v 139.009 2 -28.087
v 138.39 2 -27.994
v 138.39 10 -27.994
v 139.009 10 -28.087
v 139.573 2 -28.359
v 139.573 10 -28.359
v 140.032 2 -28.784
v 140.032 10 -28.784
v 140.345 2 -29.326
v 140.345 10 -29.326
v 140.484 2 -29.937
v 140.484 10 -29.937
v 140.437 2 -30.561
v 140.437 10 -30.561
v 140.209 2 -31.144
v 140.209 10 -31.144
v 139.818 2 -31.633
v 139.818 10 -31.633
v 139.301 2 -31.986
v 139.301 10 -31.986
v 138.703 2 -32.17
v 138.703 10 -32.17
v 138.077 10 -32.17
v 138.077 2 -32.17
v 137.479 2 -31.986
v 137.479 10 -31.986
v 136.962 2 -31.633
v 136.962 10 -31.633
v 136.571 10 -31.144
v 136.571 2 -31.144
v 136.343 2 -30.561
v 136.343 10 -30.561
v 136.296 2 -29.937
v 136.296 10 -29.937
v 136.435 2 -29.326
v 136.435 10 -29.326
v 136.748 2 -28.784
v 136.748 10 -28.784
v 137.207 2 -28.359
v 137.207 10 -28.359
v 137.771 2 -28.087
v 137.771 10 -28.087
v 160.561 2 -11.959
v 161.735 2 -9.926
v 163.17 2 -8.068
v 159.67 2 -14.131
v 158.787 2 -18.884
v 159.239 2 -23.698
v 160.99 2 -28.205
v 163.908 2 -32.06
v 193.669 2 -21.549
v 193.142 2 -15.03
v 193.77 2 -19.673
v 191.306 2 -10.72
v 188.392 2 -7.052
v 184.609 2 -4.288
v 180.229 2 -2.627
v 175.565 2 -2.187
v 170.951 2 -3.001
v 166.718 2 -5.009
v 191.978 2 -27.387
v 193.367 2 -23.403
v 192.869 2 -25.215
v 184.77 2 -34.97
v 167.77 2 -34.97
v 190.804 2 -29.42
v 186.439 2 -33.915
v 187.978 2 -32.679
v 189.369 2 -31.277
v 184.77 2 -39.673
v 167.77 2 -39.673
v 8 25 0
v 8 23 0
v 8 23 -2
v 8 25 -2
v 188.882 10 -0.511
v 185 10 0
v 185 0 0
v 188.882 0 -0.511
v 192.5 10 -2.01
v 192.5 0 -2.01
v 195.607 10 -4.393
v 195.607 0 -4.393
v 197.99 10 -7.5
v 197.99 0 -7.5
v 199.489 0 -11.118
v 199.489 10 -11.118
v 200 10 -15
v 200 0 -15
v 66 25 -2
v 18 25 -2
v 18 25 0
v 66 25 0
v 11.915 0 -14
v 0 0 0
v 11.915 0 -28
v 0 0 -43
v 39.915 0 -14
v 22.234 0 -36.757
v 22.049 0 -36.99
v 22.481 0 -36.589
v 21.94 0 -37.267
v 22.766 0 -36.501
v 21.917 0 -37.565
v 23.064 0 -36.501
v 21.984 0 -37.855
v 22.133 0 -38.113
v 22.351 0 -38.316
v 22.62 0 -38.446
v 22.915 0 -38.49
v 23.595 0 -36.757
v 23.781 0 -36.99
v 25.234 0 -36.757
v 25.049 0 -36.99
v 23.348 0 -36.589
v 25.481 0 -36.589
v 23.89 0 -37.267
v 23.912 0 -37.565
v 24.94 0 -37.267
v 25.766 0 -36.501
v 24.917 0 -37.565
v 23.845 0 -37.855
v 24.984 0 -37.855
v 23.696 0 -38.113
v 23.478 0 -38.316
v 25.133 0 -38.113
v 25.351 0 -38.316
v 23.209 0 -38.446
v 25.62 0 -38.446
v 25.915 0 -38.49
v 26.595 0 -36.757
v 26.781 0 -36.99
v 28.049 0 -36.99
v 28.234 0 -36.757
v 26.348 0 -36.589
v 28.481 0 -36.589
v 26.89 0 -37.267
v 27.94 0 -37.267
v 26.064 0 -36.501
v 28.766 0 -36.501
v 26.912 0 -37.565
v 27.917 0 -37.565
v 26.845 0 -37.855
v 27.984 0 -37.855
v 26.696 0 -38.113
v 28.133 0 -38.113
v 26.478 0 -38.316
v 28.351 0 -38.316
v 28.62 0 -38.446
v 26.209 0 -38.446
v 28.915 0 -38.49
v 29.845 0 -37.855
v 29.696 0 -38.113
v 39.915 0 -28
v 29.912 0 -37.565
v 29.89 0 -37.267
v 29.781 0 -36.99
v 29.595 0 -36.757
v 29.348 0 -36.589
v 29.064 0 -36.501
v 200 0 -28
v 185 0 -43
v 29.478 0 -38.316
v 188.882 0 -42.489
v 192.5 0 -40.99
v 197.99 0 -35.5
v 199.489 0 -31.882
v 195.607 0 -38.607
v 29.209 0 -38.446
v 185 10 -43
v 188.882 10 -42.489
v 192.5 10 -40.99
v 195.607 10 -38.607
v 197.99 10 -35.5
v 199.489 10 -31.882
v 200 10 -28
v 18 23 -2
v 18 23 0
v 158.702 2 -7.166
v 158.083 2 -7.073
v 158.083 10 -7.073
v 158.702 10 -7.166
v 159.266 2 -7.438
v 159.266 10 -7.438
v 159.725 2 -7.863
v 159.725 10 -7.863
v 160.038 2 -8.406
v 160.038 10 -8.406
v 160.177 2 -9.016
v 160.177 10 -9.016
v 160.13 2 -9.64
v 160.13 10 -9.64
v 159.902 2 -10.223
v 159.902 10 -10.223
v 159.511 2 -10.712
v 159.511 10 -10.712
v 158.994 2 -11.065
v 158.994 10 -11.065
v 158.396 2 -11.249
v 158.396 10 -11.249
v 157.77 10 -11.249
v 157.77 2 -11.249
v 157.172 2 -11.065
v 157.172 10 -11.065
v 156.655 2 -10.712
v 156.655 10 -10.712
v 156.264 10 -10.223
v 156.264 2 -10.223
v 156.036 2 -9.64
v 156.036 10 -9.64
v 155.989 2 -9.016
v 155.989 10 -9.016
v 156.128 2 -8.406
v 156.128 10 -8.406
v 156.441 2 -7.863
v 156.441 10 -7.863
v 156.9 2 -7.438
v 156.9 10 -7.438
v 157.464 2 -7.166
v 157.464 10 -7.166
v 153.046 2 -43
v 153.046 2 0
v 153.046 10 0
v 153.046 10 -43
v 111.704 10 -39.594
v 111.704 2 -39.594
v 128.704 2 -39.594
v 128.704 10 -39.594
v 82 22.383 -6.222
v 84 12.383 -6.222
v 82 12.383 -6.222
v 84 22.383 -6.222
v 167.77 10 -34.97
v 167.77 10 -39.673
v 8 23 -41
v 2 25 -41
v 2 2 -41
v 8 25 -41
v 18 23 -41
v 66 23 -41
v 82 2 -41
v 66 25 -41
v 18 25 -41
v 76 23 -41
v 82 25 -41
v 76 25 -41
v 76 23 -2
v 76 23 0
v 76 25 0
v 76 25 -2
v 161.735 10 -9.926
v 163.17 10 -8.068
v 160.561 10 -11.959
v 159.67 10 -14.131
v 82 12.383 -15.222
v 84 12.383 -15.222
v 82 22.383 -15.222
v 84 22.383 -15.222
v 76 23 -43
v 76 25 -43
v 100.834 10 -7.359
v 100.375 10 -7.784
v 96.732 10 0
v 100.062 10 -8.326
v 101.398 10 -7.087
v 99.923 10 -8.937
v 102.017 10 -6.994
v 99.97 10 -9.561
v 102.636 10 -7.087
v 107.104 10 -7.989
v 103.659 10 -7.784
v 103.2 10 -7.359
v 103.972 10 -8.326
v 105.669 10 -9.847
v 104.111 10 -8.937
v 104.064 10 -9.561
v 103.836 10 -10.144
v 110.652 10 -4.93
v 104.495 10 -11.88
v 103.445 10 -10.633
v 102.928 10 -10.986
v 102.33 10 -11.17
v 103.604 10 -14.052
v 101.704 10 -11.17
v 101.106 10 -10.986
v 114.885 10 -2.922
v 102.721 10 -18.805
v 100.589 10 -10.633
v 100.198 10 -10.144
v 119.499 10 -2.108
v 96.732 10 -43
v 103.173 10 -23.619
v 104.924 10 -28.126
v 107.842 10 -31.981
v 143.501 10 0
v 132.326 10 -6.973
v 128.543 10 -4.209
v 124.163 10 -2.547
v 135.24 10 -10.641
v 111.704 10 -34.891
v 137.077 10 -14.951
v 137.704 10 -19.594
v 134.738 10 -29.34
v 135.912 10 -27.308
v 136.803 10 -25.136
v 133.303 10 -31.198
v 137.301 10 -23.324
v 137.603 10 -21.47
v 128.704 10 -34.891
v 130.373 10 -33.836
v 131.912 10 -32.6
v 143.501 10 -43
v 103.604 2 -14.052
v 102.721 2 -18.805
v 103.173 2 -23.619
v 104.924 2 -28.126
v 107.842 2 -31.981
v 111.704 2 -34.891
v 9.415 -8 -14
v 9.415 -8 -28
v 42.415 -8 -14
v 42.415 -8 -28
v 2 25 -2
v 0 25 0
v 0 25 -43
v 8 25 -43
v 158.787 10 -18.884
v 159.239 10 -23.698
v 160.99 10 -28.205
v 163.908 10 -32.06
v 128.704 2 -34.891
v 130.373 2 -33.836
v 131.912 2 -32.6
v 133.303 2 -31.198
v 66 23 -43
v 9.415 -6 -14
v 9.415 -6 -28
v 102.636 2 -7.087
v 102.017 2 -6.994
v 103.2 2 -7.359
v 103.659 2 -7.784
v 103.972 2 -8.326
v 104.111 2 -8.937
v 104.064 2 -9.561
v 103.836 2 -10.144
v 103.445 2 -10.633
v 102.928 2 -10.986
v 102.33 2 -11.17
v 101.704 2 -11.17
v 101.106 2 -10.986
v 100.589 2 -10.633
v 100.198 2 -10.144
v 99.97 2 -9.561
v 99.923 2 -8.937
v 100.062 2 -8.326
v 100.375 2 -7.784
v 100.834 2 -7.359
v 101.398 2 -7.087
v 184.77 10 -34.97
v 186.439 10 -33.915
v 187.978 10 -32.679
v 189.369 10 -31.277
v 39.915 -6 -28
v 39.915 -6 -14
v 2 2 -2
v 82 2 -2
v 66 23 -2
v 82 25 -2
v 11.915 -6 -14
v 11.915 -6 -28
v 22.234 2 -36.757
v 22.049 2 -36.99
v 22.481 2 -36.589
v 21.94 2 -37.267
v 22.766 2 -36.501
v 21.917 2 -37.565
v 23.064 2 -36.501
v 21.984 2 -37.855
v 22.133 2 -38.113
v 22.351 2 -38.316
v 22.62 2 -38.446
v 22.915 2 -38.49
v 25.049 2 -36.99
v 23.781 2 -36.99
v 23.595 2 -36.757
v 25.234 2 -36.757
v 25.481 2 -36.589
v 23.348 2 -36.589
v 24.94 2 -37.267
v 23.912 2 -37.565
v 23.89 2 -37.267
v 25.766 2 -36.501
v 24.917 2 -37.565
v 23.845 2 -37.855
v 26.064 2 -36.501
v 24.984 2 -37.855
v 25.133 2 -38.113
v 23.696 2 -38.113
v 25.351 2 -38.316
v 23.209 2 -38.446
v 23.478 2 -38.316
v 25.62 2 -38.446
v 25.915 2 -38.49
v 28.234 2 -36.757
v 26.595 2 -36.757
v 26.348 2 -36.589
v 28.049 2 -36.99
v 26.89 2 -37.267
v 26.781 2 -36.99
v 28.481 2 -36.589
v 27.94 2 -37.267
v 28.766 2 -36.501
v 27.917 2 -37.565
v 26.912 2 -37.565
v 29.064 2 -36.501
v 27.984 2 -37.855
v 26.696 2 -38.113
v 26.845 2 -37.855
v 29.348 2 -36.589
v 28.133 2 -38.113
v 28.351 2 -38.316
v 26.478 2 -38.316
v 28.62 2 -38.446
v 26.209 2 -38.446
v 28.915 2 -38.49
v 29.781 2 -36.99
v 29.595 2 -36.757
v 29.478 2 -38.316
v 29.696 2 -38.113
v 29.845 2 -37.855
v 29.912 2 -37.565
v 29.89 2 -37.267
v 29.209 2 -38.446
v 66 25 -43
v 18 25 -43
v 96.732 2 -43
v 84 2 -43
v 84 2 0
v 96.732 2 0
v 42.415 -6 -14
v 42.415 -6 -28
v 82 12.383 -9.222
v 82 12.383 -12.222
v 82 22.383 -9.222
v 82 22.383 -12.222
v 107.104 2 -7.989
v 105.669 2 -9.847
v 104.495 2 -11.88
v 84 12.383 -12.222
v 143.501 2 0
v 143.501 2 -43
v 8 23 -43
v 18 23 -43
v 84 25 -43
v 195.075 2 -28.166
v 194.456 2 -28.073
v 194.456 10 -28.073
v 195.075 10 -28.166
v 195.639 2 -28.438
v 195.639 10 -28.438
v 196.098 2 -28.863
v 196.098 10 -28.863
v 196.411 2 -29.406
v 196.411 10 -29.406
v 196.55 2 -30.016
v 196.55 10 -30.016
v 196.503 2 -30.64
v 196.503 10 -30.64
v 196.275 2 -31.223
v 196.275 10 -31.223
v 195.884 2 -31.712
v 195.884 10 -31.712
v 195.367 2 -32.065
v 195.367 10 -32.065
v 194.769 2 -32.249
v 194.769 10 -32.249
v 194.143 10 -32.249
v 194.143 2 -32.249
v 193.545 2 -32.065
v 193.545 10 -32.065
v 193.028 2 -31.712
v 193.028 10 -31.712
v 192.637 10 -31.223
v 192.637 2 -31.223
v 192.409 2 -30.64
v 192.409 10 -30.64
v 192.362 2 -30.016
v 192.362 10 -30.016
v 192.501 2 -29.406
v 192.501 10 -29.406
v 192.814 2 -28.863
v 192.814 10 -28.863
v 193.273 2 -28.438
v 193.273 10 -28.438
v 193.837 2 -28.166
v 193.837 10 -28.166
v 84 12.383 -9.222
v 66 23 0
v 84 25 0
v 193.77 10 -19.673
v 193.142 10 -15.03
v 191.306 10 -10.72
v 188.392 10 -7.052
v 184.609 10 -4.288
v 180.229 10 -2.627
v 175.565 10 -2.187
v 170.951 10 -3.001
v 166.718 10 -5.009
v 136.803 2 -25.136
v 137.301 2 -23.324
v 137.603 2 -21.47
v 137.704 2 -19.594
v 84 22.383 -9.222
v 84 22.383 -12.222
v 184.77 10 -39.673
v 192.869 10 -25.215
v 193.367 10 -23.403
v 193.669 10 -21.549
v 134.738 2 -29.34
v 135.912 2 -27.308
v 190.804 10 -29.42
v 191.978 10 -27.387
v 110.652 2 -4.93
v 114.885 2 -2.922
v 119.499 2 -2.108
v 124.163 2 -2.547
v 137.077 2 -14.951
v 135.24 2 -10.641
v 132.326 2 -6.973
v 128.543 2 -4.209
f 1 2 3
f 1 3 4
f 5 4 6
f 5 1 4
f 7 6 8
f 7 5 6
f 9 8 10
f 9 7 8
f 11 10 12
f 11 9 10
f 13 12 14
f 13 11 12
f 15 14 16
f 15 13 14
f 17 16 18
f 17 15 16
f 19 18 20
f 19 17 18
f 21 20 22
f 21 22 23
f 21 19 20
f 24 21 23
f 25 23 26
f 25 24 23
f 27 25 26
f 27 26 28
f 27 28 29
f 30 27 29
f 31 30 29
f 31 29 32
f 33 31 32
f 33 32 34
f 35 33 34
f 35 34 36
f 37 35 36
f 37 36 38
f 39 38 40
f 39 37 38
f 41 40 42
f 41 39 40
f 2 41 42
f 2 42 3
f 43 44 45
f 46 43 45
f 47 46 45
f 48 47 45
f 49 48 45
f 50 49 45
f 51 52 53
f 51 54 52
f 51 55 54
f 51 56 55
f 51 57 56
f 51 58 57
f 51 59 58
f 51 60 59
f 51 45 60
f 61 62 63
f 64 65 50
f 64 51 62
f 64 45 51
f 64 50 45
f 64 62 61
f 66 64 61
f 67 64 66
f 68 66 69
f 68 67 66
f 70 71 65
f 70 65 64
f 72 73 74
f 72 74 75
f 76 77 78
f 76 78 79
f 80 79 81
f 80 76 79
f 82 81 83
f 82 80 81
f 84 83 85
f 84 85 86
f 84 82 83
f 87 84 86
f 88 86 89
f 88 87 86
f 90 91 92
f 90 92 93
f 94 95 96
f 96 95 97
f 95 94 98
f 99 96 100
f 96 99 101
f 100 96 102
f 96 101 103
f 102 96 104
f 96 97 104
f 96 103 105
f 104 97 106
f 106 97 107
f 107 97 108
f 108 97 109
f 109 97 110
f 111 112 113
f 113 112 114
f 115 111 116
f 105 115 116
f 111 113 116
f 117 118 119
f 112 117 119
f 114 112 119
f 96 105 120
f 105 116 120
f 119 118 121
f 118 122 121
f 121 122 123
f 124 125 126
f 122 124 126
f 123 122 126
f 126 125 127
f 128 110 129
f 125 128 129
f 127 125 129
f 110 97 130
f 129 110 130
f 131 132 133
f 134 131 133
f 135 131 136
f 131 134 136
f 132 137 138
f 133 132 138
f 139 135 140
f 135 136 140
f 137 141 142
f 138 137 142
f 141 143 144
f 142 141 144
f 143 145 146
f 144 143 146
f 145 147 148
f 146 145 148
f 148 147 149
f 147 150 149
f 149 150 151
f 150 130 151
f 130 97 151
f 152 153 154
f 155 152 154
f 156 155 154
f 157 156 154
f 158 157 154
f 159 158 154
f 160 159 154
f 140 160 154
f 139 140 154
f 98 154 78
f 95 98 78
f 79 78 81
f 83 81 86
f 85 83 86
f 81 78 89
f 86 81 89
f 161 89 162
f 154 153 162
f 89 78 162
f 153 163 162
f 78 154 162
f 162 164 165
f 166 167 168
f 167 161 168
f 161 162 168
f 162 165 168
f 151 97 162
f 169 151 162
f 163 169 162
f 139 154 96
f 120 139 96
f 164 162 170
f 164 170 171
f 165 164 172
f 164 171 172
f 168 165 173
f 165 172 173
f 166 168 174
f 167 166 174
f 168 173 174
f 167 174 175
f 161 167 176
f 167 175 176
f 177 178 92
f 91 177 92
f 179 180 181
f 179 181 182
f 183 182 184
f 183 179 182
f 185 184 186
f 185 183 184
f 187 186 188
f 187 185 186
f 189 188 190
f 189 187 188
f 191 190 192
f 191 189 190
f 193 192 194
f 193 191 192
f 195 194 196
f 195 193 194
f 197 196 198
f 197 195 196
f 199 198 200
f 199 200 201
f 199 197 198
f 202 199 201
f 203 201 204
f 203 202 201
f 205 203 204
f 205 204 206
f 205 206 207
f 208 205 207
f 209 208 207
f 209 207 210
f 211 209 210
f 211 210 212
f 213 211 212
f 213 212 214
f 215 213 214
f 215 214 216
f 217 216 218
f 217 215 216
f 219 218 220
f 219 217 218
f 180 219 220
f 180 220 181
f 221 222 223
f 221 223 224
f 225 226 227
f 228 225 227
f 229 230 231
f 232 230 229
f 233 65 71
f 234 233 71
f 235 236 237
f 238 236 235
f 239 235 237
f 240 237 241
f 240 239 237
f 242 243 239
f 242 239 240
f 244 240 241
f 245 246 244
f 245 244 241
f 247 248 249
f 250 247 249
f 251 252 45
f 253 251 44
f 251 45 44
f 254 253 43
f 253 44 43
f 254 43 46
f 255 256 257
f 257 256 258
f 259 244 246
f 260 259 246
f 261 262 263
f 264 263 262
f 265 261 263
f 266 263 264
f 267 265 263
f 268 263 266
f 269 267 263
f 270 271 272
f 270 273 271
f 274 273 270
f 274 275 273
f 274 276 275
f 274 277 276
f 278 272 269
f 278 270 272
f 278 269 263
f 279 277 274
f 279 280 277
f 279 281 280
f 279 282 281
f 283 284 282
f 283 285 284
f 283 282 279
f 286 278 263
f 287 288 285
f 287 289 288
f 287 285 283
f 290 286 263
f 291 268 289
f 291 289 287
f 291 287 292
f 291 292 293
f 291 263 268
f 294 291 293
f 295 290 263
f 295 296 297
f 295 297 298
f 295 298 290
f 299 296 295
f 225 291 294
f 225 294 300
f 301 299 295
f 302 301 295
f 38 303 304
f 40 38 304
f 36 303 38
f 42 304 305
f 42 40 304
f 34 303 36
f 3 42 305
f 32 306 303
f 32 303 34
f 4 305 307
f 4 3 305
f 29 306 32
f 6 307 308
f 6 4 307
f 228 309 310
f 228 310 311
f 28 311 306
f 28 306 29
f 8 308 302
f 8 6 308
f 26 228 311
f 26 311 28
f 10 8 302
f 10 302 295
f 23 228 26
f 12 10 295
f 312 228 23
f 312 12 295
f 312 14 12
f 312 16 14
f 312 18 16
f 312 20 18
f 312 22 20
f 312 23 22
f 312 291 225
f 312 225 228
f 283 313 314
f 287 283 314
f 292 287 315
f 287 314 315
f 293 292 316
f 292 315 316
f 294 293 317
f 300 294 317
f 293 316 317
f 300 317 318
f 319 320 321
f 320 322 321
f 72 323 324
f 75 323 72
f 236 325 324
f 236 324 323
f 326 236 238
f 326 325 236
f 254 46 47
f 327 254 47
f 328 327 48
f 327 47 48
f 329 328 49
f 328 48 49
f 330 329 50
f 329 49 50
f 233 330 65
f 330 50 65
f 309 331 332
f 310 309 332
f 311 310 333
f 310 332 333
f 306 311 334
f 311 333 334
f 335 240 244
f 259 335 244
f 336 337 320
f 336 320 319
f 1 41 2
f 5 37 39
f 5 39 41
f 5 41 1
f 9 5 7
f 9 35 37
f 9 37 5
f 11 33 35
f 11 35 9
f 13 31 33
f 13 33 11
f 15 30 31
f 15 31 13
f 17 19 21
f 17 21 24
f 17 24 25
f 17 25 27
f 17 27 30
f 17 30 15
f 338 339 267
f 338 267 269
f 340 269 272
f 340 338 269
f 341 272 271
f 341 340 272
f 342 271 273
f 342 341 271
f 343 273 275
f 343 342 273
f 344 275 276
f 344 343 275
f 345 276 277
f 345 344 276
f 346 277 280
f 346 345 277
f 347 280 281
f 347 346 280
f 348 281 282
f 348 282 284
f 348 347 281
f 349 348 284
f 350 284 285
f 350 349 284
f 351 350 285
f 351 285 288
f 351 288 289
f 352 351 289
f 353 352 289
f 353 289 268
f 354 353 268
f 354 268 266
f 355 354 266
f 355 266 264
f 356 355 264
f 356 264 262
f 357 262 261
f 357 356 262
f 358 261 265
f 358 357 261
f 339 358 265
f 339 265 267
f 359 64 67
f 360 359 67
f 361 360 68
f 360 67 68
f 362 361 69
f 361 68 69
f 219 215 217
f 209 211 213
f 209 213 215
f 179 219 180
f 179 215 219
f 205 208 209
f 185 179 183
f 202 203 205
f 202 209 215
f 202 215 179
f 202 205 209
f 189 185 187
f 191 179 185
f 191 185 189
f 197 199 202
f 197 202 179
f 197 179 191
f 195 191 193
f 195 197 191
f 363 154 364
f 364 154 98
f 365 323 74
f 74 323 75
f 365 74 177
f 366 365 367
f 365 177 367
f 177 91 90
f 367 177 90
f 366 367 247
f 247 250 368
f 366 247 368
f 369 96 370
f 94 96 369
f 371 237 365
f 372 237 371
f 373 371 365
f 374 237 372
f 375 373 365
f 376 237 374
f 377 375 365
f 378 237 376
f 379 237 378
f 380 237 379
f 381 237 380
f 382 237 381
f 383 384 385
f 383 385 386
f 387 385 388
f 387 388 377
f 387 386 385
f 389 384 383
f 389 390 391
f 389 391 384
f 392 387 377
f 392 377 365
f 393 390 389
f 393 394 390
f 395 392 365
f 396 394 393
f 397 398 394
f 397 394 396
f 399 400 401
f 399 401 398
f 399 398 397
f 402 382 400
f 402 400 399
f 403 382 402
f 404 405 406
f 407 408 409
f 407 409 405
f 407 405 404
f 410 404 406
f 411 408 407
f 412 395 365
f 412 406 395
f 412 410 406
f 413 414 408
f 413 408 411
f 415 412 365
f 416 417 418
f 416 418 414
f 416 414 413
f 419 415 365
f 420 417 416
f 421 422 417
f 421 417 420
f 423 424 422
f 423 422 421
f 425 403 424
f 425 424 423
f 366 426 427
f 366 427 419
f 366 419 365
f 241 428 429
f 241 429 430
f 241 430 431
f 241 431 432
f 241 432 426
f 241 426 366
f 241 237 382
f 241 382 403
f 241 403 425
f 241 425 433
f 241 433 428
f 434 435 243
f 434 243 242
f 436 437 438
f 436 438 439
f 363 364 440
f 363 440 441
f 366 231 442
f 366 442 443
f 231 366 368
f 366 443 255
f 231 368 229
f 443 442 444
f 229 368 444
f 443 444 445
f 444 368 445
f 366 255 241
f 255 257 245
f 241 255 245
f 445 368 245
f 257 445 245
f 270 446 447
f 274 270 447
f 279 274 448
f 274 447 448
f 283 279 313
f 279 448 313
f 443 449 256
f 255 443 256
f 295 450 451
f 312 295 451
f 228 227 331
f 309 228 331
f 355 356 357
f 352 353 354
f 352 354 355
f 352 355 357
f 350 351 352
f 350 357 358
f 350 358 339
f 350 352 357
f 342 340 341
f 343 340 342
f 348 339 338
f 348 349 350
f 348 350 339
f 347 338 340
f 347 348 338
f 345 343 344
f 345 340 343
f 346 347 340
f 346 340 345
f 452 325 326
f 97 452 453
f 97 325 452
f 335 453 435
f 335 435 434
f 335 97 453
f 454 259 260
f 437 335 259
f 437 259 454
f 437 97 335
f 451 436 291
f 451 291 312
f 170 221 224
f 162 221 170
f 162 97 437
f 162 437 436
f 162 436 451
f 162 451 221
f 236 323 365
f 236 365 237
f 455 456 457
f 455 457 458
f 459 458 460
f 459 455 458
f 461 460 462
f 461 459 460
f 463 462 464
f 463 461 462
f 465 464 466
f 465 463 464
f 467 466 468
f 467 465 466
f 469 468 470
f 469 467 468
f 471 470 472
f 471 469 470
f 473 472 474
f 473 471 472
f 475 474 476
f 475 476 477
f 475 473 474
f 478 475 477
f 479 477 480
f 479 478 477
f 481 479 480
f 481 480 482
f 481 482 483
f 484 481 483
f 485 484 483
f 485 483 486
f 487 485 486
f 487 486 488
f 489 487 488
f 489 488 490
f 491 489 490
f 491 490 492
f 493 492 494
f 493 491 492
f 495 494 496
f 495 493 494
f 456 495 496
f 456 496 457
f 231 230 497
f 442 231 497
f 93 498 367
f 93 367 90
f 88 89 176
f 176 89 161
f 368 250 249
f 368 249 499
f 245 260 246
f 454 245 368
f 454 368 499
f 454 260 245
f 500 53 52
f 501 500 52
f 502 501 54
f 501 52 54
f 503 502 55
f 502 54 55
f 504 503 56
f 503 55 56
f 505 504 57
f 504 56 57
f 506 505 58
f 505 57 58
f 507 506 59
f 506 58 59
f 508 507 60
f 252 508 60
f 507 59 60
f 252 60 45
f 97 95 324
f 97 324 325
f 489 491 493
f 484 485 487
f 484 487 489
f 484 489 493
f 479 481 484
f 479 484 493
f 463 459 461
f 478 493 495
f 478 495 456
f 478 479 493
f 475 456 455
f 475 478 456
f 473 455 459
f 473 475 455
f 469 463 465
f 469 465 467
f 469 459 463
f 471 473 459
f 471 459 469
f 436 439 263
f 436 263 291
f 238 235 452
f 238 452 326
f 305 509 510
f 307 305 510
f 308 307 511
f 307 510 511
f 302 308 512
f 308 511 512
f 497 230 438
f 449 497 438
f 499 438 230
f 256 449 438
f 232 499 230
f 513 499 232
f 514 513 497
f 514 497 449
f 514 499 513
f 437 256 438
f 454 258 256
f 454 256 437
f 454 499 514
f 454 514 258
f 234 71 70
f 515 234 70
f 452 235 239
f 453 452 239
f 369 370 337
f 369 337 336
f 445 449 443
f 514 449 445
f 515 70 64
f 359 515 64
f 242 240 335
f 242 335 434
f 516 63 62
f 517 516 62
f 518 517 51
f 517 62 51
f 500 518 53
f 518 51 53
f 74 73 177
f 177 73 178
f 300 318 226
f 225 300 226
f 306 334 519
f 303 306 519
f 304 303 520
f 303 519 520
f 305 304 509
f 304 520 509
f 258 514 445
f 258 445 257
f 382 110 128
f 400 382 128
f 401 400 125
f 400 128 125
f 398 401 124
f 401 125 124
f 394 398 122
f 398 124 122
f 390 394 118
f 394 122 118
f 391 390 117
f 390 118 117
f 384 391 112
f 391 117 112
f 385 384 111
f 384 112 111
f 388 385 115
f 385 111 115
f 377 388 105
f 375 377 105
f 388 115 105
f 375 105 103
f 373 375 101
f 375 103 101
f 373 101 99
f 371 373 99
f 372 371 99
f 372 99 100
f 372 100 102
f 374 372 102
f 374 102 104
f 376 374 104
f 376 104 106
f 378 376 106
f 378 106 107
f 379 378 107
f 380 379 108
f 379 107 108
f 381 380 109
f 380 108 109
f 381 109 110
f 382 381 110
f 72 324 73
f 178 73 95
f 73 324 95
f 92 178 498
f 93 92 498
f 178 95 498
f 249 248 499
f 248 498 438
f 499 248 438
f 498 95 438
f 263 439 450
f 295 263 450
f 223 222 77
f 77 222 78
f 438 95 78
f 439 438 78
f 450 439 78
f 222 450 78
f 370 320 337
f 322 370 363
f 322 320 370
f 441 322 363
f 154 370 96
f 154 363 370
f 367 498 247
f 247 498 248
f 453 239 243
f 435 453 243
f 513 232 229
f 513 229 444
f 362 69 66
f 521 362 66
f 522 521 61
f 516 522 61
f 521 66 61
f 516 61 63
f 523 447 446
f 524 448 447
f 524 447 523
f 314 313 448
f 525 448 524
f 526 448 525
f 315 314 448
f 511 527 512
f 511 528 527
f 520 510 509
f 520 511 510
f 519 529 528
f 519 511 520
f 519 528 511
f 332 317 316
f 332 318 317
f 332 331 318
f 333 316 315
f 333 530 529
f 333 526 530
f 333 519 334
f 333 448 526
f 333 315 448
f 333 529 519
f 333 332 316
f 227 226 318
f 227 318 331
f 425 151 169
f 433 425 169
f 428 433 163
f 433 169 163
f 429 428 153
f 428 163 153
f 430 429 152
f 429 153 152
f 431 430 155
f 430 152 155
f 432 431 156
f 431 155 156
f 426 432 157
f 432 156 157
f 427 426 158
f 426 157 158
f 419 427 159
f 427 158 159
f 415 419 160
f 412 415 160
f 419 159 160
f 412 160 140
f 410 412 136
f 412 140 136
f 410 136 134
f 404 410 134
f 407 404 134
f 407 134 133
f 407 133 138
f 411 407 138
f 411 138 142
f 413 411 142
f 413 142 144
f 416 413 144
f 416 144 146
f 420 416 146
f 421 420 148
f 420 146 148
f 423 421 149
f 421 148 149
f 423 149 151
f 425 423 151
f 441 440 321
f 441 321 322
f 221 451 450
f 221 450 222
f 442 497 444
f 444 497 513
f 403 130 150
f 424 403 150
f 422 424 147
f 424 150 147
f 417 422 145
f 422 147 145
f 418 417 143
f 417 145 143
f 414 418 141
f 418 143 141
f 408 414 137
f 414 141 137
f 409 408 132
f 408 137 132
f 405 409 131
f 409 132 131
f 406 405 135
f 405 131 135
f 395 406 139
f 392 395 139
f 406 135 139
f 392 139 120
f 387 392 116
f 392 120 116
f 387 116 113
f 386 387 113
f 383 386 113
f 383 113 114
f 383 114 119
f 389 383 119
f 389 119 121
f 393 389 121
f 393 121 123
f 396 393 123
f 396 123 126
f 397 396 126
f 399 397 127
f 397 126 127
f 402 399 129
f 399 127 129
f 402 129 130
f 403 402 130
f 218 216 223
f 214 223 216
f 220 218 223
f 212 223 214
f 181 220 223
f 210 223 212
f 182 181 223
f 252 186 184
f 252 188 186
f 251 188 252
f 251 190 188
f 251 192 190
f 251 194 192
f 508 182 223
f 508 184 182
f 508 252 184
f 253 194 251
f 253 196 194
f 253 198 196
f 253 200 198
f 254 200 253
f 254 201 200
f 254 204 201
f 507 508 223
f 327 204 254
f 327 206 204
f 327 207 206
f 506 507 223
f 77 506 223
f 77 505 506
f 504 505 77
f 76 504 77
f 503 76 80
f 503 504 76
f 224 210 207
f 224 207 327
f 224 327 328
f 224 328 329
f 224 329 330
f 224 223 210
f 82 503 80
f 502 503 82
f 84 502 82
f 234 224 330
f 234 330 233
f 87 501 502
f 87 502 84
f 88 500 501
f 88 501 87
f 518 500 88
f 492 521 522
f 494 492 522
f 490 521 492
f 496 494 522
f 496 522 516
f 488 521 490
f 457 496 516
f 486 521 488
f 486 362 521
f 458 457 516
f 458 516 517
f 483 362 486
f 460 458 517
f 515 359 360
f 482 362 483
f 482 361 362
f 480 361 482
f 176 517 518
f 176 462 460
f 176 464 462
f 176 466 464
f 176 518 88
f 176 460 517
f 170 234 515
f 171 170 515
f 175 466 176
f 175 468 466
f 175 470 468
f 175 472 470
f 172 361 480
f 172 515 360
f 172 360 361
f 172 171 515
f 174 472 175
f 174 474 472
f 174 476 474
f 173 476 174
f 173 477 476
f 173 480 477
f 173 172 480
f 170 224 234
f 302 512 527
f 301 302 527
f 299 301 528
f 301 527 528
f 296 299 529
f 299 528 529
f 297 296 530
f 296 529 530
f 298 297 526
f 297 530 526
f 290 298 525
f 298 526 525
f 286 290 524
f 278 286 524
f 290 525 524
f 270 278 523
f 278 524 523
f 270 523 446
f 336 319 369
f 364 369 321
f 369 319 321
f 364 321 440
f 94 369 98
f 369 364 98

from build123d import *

# Parameters (mm, degrees)
SKETCH1_W           = 200
SKETCH1_H           = 43
BOSS_EXTRUDE1_DEPTH = 25
SKETCH2_W           = 80
SKETCH2_H           = 39
CUT_EXTRUDE1_DEPTH  = 23
SKETCH3_W           = 28
SKETCH3_H           = 14
BOSS_EXTRUDE2_DEPTH = 8
SKETCH4_W           = 14
SKETCH4_H           = 2
BOSS_EXTRUDE3_DEPTH = 2.5
SKETCH5_W           = 14
SKETCH5_H           = 2
BOSS_EXTRUDE4_DEPTH = 2.5
SKETCH6_R           = 1
CUT_EXTRUDE2_DEPTH  = 2
SKETCH7_W           = 116
SKETCH7_H           = 43
CUT_EXTRUDE3_DEPTH  = 23
SKETCH8_W           = 46.953712071
SKETCH8_H           = 43
SKETCH8_R           = 2.1
BOSS_EXTRUDE6_DEPTH = 8
SKETCH9_W           = 10
SKETCH9_H           = 2
CUT_EXTRUDE4_DEPTH  = 61
SKETCH10_W          = 46.769233888
SKETCH10_H          = 43
SKETCH10_R          = 2.1
BOSS_EXTRUDE7_DEPTH = 8
SKETCH11_W          = 3
SKETCH11_H          = 10
CUT_EXTRUDE5_DEPTH  = 8
FILLET1_R           = 15
FILLET2_R           = 15


with BuildPart() as part:
    # Sketch1 → Boss-Extrude1 (new body)
    with BuildSketch(Plane(origin=(0, 0, 0), x_dir=(1, 0, 0), z_dir=(0, 1, 0))):
        with Locations((100, 21.5)):
            Rectangle(SKETCH1_W, SKETCH1_H)
    extrude(amount=BOSS_EXTRUDE1_DEPTH)

    # Sketch2 → Cut-Extrude1 (cut)
    with BuildSketch(Plane(origin=(0, 25, 0), x_dir=(1, 0, 0), z_dir=(0, 1, 0))):
        with Locations((42, 21.5)):
            Rectangle(SKETCH2_W, SKETCH2_H)
    extrude(amount=-CUT_EXTRUDE1_DEPTH, mode=Mode.SUBTRACT)

    # Sketch3 → Boss-Extrude2 (add)
    with BuildSketch(Plane.XZ):
        with Locations((25.914586037, -21)):
            Rectangle(SKETCH3_W, SKETCH3_H)
    extrude(amount=BOSS_EXTRUDE2_DEPTH)

    # Sketch4 → Boss-Extrude3 (add)
    with BuildSketch(Plane(origin=(39.914586037, 0, 0), x_dir=(0, 0, -1), z_dir=(1, 0, 0))):
        with Locations((21, -7)):
            Rectangle(SKETCH4_W, SKETCH4_H)
    extrude(amount=BOSS_EXTRUDE3_DEPTH)

    # Sketch5 → Boss-Extrude4 (add)
    with BuildSketch(Plane.ZY.offset(-11.914586037)):
        with Locations((-21, -7)):
            Rectangle(SKETCH5_W, SKETCH5_H)
    extrude(amount=BOSS_EXTRUDE4_DEPTH)

    # Sketch6 → Cut-Extrude2 (cut)
    with BuildSketch(Plane.XZ):
        with Locations(Location((25.914586037, -37.49, 0), (0, 0, 270))):
            Circle(SKETCH6_R)
        with Locations(Location((28.914586037, -37.49, 0), (0, 0, 270))):
            Circle(SKETCH6_R)
        with Locations(Location((22.914586037, -37.49, 0), (0, 0, 270))):
            Circle(SKETCH6_R)
    extrude(amount=-CUT_EXTRUDE2_DEPTH, mode=Mode.SUBTRACT)

    # Sketch7 → Cut-Extrude3 (cut)
    with BuildSketch(Plane(origin=(0, 25, 0), x_dir=(1, 0, 0), z_dir=(0, 1, 0))):
        with Locations((142, 21.5)):
            Rectangle(SKETCH7_W, SKETCH7_H)
    extrude(amount=-CUT_EXTRUDE3_DEPTH, mode=Mode.SUBTRACT)

    # Sketch8 → Boss-Extrude6 (add)
    with BuildSketch(Plane(origin=(0, 2, 0), x_dir=(1, 0, 0), z_dir=(0, 1, 0))):
        with Locations((176.523143965, 21.5)):
            Rectangle(SKETCH8_W, SKETCH8_H)
        with BuildLine():
            Line((167.769501391, 39.672770255), (184.769501391, 39.672770255))
            Line((184.769501391, 39.672770255), (184.769501391, 34.969828795))
            ThreePointArc((184.769501391, 34.969828795), (187.225820525, 33.318614715), (189.368743796, 31.277073268))
            Line((189.368743796, 31.277073268), (192.70603487, 33.203859168))
            ThreePointArc((192.70603487, 33.203859168), (197.487123783, 31.922770255), (196.20603487, 27.141681341))
            Line((196.20603487, 27.141681341), (192.868743796, 25.214895441))
            ThreePointArc((192.868743796, 25.214895441), (193.542844178, 22.480194155), (193.769501391, 19.672770255))
            ThreePointArc((193.769501391, 19.672770255), (182.474872367, 3.309904642), (163.170258986, 8.068467242))
            Line((163.170258986, 8.068467242), (159.832967911, 6.141681341))
            ThreePointArc((159.832967911, 6.141681341), (155.051878998, 7.422770255), (156.332967911, 12.203859168))
            Line((156.332967911, 12.203859168), (159.670258986, 14.130645068))
            ThreePointArc((159.670258986, 14.130645068), (159.958128459, 26.012258646), (167.769501391, 34.969828795))
            Line((167.769501391, 34.969828795), (167.769501391, 39.672770255))
        make_face(mode=Mode.SUBTRACT)
        with BuildLine():
            Line((192.70603487, 33.203859168), (189.368743796, 31.277073268))
            ThreePointArc((189.368743796, 31.277073268), (191.424945957, 28.422770255), (192.868743796, 25.214895441))
            Line((192.868743796, 25.214895441), (196.20603487, 27.141681341))
            ThreePointArc((196.20603487, 27.141681341), (197.487123783, 31.922770255), (192.70603487, 33.203859168))
        make_face()
        with Locations(Location((194.45603487, 30.172770255, 0), (0, 0, 270))):
            Circle(SKETCH8_R, mode=Mode.SUBTRACT)
        with BuildLine():
            ThreePointArc((163.170258986, 8.068467242), (161.114056824, 10.922770255), (159.670258986, 14.130645068))
            Line((159.670258986, 14.130645068), (156.332967911, 12.203859168))
            ThreePointArc((156.332967911, 12.203859168), (155.051878998, 7.422770255), (159.832967911, 6.141681341))
            Line((159.832967911, 6.141681341), (163.170258986, 8.068467242))
        make_face()
        with Locations(Location((158.082967911, 9.172770255, 0), (0, 0, 270))):
            Circle(SKETCH8_R, mode=Mode.SUBTRACT)
    extrude(amount=BOSS_EXTRUDE6_DEPTH)

    # Sketch9 → Cut-Extrude4 (cut)
    with BuildSketch(Plane.XY):
        with Locations((13, 24)):
            Rectangle(SKETCH9_W, SKETCH9_H)
        with Locations((71, 24)):
            Rectangle(SKETCH9_W, SKETCH9_H)
    extrude(amount=-CUT_EXTRUDE4_DEPTH, mode=Mode.SUBTRACT)

    # Sketch10 → Boss-Extrude7 (add)
    with BuildSketch(Plane(origin=(0, 2, 0), x_dir=(1, 0, 0), z_dir=(0, 1, 0))):
        with Locations((120.116777129, 21.5)):
            Rectangle(SKETCH10_W, SKETCH10_H)
        with BuildLine():
            Line((111.703601521, 39.593697937), (128.703601521, 39.593697937))
            Line((128.703601521, 39.593697937), (128.703601521, 34.890756478))
            ThreePointArc((128.703601521, 34.890756478), (131.159920655, 33.239542397), (133.302843926, 31.19800095))
            Line((133.302843926, 31.19800095), (136.640135, 33.12478685))
            ThreePointArc((136.640135, 33.12478685), (141.421223914, 31.843697937), (140.140135, 27.062609024))
            Line((140.140135, 27.062609024), (136.802843926, 25.135823124))
            ThreePointArc((136.802843926, 25.135823124), (137.476944308, 22.401121838), (137.703601521, 19.593697937))
            ThreePointArc((137.703601521, 19.593697937), (126.408972497, 3.230832325), (107.104359116, 7.989394924))
            Line((107.104359116, 7.989394924), (103.767068041, 6.062609024))
            ThreePointArc((103.767068041, 6.062609024), (98.985979128, 7.343697937), (100.267068041, 12.12478685))
            Line((100.267068041, 12.12478685), (103.604359116, 14.051572751))
            ThreePointArc((103.604359116, 14.051572751), (103.892228589, 25.933186329), (111.703601521, 34.890756478))
            Line((111.703601521, 34.890756478), (111.703601521, 39.593697937))
        make_face(mode=Mode.SUBTRACT)
        with BuildLine():
            Line((136.640135, 33.12478685), (133.302843926, 31.19800095))
            ThreePointArc((133.302843926, 31.19800095), (135.359046087, 28.343697937), (136.802843926, 25.135823124))
            Line((136.802843926, 25.135823124), (140.140135, 27.062609024))
            ThreePointArc((140.140135, 27.062609024), (141.421223914, 31.843697937), (136.640135, 33.12478685))
        make_face()
        with Locations(Location((138.390135, 30.093697937, 0), (0, 0, 270))):
            Circle(SKETCH10_R, mode=Mode.SUBTRACT)
        with BuildLine():
            ThreePointArc((107.104359116, 7.989394924), (105.048156955, 10.843697937), (103.604359116, 14.051572751))
            Line((103.604359116, 14.051572751), (100.267068041, 12.12478685))
            ThreePointArc((100.267068041, 12.12478685), (98.985979128, 7.343697937), (103.767068041, 6.062609024))
            Line((103.767068041, 6.062609024), (107.104359116, 7.989394924))
        make_face()
        with Locations(Location((102.017068041, 9.093697937, 0), (0, 0, 270))):
            Circle(SKETCH10_R, mode=Mode.SUBTRACT)
    extrude(amount=BOSS_EXTRUDE7_DEPTH)

    # Sketch11 → Cut-Extrude5 (cut)
    with BuildSketch(Plane(origin=(84, 0, 0), x_dir=(0, 0, -1), z_dir=(1, 0, 0))):
        with Locations((13.721629554, 17.383252488)):
            Rectangle(SKETCH11_W, SKETCH11_H)
        with Locations((7.721629554, 17.383252488)):
            Rectangle(SKETCH11_W, SKETCH11_H)
    extrude(amount=-CUT_EXTRUDE5_DEPTH, mode=Mode.SUBTRACT)

    # Fillet1
    fillet1_edges = [part.edges().sort_by_distance(p)[0] for p in [
        (200, 5, 0),
    ]]
    fillet(fillet1_edges, radius=FILLET1_R)

    # Fillet2
    fillet2_edges = [part.edges().sort_by_distance(p)[0] for p in [
        (200, 5, -43),
    ]]
    fillet(fillet2_edges, radius=FILLET2_R)


solid = part.part
